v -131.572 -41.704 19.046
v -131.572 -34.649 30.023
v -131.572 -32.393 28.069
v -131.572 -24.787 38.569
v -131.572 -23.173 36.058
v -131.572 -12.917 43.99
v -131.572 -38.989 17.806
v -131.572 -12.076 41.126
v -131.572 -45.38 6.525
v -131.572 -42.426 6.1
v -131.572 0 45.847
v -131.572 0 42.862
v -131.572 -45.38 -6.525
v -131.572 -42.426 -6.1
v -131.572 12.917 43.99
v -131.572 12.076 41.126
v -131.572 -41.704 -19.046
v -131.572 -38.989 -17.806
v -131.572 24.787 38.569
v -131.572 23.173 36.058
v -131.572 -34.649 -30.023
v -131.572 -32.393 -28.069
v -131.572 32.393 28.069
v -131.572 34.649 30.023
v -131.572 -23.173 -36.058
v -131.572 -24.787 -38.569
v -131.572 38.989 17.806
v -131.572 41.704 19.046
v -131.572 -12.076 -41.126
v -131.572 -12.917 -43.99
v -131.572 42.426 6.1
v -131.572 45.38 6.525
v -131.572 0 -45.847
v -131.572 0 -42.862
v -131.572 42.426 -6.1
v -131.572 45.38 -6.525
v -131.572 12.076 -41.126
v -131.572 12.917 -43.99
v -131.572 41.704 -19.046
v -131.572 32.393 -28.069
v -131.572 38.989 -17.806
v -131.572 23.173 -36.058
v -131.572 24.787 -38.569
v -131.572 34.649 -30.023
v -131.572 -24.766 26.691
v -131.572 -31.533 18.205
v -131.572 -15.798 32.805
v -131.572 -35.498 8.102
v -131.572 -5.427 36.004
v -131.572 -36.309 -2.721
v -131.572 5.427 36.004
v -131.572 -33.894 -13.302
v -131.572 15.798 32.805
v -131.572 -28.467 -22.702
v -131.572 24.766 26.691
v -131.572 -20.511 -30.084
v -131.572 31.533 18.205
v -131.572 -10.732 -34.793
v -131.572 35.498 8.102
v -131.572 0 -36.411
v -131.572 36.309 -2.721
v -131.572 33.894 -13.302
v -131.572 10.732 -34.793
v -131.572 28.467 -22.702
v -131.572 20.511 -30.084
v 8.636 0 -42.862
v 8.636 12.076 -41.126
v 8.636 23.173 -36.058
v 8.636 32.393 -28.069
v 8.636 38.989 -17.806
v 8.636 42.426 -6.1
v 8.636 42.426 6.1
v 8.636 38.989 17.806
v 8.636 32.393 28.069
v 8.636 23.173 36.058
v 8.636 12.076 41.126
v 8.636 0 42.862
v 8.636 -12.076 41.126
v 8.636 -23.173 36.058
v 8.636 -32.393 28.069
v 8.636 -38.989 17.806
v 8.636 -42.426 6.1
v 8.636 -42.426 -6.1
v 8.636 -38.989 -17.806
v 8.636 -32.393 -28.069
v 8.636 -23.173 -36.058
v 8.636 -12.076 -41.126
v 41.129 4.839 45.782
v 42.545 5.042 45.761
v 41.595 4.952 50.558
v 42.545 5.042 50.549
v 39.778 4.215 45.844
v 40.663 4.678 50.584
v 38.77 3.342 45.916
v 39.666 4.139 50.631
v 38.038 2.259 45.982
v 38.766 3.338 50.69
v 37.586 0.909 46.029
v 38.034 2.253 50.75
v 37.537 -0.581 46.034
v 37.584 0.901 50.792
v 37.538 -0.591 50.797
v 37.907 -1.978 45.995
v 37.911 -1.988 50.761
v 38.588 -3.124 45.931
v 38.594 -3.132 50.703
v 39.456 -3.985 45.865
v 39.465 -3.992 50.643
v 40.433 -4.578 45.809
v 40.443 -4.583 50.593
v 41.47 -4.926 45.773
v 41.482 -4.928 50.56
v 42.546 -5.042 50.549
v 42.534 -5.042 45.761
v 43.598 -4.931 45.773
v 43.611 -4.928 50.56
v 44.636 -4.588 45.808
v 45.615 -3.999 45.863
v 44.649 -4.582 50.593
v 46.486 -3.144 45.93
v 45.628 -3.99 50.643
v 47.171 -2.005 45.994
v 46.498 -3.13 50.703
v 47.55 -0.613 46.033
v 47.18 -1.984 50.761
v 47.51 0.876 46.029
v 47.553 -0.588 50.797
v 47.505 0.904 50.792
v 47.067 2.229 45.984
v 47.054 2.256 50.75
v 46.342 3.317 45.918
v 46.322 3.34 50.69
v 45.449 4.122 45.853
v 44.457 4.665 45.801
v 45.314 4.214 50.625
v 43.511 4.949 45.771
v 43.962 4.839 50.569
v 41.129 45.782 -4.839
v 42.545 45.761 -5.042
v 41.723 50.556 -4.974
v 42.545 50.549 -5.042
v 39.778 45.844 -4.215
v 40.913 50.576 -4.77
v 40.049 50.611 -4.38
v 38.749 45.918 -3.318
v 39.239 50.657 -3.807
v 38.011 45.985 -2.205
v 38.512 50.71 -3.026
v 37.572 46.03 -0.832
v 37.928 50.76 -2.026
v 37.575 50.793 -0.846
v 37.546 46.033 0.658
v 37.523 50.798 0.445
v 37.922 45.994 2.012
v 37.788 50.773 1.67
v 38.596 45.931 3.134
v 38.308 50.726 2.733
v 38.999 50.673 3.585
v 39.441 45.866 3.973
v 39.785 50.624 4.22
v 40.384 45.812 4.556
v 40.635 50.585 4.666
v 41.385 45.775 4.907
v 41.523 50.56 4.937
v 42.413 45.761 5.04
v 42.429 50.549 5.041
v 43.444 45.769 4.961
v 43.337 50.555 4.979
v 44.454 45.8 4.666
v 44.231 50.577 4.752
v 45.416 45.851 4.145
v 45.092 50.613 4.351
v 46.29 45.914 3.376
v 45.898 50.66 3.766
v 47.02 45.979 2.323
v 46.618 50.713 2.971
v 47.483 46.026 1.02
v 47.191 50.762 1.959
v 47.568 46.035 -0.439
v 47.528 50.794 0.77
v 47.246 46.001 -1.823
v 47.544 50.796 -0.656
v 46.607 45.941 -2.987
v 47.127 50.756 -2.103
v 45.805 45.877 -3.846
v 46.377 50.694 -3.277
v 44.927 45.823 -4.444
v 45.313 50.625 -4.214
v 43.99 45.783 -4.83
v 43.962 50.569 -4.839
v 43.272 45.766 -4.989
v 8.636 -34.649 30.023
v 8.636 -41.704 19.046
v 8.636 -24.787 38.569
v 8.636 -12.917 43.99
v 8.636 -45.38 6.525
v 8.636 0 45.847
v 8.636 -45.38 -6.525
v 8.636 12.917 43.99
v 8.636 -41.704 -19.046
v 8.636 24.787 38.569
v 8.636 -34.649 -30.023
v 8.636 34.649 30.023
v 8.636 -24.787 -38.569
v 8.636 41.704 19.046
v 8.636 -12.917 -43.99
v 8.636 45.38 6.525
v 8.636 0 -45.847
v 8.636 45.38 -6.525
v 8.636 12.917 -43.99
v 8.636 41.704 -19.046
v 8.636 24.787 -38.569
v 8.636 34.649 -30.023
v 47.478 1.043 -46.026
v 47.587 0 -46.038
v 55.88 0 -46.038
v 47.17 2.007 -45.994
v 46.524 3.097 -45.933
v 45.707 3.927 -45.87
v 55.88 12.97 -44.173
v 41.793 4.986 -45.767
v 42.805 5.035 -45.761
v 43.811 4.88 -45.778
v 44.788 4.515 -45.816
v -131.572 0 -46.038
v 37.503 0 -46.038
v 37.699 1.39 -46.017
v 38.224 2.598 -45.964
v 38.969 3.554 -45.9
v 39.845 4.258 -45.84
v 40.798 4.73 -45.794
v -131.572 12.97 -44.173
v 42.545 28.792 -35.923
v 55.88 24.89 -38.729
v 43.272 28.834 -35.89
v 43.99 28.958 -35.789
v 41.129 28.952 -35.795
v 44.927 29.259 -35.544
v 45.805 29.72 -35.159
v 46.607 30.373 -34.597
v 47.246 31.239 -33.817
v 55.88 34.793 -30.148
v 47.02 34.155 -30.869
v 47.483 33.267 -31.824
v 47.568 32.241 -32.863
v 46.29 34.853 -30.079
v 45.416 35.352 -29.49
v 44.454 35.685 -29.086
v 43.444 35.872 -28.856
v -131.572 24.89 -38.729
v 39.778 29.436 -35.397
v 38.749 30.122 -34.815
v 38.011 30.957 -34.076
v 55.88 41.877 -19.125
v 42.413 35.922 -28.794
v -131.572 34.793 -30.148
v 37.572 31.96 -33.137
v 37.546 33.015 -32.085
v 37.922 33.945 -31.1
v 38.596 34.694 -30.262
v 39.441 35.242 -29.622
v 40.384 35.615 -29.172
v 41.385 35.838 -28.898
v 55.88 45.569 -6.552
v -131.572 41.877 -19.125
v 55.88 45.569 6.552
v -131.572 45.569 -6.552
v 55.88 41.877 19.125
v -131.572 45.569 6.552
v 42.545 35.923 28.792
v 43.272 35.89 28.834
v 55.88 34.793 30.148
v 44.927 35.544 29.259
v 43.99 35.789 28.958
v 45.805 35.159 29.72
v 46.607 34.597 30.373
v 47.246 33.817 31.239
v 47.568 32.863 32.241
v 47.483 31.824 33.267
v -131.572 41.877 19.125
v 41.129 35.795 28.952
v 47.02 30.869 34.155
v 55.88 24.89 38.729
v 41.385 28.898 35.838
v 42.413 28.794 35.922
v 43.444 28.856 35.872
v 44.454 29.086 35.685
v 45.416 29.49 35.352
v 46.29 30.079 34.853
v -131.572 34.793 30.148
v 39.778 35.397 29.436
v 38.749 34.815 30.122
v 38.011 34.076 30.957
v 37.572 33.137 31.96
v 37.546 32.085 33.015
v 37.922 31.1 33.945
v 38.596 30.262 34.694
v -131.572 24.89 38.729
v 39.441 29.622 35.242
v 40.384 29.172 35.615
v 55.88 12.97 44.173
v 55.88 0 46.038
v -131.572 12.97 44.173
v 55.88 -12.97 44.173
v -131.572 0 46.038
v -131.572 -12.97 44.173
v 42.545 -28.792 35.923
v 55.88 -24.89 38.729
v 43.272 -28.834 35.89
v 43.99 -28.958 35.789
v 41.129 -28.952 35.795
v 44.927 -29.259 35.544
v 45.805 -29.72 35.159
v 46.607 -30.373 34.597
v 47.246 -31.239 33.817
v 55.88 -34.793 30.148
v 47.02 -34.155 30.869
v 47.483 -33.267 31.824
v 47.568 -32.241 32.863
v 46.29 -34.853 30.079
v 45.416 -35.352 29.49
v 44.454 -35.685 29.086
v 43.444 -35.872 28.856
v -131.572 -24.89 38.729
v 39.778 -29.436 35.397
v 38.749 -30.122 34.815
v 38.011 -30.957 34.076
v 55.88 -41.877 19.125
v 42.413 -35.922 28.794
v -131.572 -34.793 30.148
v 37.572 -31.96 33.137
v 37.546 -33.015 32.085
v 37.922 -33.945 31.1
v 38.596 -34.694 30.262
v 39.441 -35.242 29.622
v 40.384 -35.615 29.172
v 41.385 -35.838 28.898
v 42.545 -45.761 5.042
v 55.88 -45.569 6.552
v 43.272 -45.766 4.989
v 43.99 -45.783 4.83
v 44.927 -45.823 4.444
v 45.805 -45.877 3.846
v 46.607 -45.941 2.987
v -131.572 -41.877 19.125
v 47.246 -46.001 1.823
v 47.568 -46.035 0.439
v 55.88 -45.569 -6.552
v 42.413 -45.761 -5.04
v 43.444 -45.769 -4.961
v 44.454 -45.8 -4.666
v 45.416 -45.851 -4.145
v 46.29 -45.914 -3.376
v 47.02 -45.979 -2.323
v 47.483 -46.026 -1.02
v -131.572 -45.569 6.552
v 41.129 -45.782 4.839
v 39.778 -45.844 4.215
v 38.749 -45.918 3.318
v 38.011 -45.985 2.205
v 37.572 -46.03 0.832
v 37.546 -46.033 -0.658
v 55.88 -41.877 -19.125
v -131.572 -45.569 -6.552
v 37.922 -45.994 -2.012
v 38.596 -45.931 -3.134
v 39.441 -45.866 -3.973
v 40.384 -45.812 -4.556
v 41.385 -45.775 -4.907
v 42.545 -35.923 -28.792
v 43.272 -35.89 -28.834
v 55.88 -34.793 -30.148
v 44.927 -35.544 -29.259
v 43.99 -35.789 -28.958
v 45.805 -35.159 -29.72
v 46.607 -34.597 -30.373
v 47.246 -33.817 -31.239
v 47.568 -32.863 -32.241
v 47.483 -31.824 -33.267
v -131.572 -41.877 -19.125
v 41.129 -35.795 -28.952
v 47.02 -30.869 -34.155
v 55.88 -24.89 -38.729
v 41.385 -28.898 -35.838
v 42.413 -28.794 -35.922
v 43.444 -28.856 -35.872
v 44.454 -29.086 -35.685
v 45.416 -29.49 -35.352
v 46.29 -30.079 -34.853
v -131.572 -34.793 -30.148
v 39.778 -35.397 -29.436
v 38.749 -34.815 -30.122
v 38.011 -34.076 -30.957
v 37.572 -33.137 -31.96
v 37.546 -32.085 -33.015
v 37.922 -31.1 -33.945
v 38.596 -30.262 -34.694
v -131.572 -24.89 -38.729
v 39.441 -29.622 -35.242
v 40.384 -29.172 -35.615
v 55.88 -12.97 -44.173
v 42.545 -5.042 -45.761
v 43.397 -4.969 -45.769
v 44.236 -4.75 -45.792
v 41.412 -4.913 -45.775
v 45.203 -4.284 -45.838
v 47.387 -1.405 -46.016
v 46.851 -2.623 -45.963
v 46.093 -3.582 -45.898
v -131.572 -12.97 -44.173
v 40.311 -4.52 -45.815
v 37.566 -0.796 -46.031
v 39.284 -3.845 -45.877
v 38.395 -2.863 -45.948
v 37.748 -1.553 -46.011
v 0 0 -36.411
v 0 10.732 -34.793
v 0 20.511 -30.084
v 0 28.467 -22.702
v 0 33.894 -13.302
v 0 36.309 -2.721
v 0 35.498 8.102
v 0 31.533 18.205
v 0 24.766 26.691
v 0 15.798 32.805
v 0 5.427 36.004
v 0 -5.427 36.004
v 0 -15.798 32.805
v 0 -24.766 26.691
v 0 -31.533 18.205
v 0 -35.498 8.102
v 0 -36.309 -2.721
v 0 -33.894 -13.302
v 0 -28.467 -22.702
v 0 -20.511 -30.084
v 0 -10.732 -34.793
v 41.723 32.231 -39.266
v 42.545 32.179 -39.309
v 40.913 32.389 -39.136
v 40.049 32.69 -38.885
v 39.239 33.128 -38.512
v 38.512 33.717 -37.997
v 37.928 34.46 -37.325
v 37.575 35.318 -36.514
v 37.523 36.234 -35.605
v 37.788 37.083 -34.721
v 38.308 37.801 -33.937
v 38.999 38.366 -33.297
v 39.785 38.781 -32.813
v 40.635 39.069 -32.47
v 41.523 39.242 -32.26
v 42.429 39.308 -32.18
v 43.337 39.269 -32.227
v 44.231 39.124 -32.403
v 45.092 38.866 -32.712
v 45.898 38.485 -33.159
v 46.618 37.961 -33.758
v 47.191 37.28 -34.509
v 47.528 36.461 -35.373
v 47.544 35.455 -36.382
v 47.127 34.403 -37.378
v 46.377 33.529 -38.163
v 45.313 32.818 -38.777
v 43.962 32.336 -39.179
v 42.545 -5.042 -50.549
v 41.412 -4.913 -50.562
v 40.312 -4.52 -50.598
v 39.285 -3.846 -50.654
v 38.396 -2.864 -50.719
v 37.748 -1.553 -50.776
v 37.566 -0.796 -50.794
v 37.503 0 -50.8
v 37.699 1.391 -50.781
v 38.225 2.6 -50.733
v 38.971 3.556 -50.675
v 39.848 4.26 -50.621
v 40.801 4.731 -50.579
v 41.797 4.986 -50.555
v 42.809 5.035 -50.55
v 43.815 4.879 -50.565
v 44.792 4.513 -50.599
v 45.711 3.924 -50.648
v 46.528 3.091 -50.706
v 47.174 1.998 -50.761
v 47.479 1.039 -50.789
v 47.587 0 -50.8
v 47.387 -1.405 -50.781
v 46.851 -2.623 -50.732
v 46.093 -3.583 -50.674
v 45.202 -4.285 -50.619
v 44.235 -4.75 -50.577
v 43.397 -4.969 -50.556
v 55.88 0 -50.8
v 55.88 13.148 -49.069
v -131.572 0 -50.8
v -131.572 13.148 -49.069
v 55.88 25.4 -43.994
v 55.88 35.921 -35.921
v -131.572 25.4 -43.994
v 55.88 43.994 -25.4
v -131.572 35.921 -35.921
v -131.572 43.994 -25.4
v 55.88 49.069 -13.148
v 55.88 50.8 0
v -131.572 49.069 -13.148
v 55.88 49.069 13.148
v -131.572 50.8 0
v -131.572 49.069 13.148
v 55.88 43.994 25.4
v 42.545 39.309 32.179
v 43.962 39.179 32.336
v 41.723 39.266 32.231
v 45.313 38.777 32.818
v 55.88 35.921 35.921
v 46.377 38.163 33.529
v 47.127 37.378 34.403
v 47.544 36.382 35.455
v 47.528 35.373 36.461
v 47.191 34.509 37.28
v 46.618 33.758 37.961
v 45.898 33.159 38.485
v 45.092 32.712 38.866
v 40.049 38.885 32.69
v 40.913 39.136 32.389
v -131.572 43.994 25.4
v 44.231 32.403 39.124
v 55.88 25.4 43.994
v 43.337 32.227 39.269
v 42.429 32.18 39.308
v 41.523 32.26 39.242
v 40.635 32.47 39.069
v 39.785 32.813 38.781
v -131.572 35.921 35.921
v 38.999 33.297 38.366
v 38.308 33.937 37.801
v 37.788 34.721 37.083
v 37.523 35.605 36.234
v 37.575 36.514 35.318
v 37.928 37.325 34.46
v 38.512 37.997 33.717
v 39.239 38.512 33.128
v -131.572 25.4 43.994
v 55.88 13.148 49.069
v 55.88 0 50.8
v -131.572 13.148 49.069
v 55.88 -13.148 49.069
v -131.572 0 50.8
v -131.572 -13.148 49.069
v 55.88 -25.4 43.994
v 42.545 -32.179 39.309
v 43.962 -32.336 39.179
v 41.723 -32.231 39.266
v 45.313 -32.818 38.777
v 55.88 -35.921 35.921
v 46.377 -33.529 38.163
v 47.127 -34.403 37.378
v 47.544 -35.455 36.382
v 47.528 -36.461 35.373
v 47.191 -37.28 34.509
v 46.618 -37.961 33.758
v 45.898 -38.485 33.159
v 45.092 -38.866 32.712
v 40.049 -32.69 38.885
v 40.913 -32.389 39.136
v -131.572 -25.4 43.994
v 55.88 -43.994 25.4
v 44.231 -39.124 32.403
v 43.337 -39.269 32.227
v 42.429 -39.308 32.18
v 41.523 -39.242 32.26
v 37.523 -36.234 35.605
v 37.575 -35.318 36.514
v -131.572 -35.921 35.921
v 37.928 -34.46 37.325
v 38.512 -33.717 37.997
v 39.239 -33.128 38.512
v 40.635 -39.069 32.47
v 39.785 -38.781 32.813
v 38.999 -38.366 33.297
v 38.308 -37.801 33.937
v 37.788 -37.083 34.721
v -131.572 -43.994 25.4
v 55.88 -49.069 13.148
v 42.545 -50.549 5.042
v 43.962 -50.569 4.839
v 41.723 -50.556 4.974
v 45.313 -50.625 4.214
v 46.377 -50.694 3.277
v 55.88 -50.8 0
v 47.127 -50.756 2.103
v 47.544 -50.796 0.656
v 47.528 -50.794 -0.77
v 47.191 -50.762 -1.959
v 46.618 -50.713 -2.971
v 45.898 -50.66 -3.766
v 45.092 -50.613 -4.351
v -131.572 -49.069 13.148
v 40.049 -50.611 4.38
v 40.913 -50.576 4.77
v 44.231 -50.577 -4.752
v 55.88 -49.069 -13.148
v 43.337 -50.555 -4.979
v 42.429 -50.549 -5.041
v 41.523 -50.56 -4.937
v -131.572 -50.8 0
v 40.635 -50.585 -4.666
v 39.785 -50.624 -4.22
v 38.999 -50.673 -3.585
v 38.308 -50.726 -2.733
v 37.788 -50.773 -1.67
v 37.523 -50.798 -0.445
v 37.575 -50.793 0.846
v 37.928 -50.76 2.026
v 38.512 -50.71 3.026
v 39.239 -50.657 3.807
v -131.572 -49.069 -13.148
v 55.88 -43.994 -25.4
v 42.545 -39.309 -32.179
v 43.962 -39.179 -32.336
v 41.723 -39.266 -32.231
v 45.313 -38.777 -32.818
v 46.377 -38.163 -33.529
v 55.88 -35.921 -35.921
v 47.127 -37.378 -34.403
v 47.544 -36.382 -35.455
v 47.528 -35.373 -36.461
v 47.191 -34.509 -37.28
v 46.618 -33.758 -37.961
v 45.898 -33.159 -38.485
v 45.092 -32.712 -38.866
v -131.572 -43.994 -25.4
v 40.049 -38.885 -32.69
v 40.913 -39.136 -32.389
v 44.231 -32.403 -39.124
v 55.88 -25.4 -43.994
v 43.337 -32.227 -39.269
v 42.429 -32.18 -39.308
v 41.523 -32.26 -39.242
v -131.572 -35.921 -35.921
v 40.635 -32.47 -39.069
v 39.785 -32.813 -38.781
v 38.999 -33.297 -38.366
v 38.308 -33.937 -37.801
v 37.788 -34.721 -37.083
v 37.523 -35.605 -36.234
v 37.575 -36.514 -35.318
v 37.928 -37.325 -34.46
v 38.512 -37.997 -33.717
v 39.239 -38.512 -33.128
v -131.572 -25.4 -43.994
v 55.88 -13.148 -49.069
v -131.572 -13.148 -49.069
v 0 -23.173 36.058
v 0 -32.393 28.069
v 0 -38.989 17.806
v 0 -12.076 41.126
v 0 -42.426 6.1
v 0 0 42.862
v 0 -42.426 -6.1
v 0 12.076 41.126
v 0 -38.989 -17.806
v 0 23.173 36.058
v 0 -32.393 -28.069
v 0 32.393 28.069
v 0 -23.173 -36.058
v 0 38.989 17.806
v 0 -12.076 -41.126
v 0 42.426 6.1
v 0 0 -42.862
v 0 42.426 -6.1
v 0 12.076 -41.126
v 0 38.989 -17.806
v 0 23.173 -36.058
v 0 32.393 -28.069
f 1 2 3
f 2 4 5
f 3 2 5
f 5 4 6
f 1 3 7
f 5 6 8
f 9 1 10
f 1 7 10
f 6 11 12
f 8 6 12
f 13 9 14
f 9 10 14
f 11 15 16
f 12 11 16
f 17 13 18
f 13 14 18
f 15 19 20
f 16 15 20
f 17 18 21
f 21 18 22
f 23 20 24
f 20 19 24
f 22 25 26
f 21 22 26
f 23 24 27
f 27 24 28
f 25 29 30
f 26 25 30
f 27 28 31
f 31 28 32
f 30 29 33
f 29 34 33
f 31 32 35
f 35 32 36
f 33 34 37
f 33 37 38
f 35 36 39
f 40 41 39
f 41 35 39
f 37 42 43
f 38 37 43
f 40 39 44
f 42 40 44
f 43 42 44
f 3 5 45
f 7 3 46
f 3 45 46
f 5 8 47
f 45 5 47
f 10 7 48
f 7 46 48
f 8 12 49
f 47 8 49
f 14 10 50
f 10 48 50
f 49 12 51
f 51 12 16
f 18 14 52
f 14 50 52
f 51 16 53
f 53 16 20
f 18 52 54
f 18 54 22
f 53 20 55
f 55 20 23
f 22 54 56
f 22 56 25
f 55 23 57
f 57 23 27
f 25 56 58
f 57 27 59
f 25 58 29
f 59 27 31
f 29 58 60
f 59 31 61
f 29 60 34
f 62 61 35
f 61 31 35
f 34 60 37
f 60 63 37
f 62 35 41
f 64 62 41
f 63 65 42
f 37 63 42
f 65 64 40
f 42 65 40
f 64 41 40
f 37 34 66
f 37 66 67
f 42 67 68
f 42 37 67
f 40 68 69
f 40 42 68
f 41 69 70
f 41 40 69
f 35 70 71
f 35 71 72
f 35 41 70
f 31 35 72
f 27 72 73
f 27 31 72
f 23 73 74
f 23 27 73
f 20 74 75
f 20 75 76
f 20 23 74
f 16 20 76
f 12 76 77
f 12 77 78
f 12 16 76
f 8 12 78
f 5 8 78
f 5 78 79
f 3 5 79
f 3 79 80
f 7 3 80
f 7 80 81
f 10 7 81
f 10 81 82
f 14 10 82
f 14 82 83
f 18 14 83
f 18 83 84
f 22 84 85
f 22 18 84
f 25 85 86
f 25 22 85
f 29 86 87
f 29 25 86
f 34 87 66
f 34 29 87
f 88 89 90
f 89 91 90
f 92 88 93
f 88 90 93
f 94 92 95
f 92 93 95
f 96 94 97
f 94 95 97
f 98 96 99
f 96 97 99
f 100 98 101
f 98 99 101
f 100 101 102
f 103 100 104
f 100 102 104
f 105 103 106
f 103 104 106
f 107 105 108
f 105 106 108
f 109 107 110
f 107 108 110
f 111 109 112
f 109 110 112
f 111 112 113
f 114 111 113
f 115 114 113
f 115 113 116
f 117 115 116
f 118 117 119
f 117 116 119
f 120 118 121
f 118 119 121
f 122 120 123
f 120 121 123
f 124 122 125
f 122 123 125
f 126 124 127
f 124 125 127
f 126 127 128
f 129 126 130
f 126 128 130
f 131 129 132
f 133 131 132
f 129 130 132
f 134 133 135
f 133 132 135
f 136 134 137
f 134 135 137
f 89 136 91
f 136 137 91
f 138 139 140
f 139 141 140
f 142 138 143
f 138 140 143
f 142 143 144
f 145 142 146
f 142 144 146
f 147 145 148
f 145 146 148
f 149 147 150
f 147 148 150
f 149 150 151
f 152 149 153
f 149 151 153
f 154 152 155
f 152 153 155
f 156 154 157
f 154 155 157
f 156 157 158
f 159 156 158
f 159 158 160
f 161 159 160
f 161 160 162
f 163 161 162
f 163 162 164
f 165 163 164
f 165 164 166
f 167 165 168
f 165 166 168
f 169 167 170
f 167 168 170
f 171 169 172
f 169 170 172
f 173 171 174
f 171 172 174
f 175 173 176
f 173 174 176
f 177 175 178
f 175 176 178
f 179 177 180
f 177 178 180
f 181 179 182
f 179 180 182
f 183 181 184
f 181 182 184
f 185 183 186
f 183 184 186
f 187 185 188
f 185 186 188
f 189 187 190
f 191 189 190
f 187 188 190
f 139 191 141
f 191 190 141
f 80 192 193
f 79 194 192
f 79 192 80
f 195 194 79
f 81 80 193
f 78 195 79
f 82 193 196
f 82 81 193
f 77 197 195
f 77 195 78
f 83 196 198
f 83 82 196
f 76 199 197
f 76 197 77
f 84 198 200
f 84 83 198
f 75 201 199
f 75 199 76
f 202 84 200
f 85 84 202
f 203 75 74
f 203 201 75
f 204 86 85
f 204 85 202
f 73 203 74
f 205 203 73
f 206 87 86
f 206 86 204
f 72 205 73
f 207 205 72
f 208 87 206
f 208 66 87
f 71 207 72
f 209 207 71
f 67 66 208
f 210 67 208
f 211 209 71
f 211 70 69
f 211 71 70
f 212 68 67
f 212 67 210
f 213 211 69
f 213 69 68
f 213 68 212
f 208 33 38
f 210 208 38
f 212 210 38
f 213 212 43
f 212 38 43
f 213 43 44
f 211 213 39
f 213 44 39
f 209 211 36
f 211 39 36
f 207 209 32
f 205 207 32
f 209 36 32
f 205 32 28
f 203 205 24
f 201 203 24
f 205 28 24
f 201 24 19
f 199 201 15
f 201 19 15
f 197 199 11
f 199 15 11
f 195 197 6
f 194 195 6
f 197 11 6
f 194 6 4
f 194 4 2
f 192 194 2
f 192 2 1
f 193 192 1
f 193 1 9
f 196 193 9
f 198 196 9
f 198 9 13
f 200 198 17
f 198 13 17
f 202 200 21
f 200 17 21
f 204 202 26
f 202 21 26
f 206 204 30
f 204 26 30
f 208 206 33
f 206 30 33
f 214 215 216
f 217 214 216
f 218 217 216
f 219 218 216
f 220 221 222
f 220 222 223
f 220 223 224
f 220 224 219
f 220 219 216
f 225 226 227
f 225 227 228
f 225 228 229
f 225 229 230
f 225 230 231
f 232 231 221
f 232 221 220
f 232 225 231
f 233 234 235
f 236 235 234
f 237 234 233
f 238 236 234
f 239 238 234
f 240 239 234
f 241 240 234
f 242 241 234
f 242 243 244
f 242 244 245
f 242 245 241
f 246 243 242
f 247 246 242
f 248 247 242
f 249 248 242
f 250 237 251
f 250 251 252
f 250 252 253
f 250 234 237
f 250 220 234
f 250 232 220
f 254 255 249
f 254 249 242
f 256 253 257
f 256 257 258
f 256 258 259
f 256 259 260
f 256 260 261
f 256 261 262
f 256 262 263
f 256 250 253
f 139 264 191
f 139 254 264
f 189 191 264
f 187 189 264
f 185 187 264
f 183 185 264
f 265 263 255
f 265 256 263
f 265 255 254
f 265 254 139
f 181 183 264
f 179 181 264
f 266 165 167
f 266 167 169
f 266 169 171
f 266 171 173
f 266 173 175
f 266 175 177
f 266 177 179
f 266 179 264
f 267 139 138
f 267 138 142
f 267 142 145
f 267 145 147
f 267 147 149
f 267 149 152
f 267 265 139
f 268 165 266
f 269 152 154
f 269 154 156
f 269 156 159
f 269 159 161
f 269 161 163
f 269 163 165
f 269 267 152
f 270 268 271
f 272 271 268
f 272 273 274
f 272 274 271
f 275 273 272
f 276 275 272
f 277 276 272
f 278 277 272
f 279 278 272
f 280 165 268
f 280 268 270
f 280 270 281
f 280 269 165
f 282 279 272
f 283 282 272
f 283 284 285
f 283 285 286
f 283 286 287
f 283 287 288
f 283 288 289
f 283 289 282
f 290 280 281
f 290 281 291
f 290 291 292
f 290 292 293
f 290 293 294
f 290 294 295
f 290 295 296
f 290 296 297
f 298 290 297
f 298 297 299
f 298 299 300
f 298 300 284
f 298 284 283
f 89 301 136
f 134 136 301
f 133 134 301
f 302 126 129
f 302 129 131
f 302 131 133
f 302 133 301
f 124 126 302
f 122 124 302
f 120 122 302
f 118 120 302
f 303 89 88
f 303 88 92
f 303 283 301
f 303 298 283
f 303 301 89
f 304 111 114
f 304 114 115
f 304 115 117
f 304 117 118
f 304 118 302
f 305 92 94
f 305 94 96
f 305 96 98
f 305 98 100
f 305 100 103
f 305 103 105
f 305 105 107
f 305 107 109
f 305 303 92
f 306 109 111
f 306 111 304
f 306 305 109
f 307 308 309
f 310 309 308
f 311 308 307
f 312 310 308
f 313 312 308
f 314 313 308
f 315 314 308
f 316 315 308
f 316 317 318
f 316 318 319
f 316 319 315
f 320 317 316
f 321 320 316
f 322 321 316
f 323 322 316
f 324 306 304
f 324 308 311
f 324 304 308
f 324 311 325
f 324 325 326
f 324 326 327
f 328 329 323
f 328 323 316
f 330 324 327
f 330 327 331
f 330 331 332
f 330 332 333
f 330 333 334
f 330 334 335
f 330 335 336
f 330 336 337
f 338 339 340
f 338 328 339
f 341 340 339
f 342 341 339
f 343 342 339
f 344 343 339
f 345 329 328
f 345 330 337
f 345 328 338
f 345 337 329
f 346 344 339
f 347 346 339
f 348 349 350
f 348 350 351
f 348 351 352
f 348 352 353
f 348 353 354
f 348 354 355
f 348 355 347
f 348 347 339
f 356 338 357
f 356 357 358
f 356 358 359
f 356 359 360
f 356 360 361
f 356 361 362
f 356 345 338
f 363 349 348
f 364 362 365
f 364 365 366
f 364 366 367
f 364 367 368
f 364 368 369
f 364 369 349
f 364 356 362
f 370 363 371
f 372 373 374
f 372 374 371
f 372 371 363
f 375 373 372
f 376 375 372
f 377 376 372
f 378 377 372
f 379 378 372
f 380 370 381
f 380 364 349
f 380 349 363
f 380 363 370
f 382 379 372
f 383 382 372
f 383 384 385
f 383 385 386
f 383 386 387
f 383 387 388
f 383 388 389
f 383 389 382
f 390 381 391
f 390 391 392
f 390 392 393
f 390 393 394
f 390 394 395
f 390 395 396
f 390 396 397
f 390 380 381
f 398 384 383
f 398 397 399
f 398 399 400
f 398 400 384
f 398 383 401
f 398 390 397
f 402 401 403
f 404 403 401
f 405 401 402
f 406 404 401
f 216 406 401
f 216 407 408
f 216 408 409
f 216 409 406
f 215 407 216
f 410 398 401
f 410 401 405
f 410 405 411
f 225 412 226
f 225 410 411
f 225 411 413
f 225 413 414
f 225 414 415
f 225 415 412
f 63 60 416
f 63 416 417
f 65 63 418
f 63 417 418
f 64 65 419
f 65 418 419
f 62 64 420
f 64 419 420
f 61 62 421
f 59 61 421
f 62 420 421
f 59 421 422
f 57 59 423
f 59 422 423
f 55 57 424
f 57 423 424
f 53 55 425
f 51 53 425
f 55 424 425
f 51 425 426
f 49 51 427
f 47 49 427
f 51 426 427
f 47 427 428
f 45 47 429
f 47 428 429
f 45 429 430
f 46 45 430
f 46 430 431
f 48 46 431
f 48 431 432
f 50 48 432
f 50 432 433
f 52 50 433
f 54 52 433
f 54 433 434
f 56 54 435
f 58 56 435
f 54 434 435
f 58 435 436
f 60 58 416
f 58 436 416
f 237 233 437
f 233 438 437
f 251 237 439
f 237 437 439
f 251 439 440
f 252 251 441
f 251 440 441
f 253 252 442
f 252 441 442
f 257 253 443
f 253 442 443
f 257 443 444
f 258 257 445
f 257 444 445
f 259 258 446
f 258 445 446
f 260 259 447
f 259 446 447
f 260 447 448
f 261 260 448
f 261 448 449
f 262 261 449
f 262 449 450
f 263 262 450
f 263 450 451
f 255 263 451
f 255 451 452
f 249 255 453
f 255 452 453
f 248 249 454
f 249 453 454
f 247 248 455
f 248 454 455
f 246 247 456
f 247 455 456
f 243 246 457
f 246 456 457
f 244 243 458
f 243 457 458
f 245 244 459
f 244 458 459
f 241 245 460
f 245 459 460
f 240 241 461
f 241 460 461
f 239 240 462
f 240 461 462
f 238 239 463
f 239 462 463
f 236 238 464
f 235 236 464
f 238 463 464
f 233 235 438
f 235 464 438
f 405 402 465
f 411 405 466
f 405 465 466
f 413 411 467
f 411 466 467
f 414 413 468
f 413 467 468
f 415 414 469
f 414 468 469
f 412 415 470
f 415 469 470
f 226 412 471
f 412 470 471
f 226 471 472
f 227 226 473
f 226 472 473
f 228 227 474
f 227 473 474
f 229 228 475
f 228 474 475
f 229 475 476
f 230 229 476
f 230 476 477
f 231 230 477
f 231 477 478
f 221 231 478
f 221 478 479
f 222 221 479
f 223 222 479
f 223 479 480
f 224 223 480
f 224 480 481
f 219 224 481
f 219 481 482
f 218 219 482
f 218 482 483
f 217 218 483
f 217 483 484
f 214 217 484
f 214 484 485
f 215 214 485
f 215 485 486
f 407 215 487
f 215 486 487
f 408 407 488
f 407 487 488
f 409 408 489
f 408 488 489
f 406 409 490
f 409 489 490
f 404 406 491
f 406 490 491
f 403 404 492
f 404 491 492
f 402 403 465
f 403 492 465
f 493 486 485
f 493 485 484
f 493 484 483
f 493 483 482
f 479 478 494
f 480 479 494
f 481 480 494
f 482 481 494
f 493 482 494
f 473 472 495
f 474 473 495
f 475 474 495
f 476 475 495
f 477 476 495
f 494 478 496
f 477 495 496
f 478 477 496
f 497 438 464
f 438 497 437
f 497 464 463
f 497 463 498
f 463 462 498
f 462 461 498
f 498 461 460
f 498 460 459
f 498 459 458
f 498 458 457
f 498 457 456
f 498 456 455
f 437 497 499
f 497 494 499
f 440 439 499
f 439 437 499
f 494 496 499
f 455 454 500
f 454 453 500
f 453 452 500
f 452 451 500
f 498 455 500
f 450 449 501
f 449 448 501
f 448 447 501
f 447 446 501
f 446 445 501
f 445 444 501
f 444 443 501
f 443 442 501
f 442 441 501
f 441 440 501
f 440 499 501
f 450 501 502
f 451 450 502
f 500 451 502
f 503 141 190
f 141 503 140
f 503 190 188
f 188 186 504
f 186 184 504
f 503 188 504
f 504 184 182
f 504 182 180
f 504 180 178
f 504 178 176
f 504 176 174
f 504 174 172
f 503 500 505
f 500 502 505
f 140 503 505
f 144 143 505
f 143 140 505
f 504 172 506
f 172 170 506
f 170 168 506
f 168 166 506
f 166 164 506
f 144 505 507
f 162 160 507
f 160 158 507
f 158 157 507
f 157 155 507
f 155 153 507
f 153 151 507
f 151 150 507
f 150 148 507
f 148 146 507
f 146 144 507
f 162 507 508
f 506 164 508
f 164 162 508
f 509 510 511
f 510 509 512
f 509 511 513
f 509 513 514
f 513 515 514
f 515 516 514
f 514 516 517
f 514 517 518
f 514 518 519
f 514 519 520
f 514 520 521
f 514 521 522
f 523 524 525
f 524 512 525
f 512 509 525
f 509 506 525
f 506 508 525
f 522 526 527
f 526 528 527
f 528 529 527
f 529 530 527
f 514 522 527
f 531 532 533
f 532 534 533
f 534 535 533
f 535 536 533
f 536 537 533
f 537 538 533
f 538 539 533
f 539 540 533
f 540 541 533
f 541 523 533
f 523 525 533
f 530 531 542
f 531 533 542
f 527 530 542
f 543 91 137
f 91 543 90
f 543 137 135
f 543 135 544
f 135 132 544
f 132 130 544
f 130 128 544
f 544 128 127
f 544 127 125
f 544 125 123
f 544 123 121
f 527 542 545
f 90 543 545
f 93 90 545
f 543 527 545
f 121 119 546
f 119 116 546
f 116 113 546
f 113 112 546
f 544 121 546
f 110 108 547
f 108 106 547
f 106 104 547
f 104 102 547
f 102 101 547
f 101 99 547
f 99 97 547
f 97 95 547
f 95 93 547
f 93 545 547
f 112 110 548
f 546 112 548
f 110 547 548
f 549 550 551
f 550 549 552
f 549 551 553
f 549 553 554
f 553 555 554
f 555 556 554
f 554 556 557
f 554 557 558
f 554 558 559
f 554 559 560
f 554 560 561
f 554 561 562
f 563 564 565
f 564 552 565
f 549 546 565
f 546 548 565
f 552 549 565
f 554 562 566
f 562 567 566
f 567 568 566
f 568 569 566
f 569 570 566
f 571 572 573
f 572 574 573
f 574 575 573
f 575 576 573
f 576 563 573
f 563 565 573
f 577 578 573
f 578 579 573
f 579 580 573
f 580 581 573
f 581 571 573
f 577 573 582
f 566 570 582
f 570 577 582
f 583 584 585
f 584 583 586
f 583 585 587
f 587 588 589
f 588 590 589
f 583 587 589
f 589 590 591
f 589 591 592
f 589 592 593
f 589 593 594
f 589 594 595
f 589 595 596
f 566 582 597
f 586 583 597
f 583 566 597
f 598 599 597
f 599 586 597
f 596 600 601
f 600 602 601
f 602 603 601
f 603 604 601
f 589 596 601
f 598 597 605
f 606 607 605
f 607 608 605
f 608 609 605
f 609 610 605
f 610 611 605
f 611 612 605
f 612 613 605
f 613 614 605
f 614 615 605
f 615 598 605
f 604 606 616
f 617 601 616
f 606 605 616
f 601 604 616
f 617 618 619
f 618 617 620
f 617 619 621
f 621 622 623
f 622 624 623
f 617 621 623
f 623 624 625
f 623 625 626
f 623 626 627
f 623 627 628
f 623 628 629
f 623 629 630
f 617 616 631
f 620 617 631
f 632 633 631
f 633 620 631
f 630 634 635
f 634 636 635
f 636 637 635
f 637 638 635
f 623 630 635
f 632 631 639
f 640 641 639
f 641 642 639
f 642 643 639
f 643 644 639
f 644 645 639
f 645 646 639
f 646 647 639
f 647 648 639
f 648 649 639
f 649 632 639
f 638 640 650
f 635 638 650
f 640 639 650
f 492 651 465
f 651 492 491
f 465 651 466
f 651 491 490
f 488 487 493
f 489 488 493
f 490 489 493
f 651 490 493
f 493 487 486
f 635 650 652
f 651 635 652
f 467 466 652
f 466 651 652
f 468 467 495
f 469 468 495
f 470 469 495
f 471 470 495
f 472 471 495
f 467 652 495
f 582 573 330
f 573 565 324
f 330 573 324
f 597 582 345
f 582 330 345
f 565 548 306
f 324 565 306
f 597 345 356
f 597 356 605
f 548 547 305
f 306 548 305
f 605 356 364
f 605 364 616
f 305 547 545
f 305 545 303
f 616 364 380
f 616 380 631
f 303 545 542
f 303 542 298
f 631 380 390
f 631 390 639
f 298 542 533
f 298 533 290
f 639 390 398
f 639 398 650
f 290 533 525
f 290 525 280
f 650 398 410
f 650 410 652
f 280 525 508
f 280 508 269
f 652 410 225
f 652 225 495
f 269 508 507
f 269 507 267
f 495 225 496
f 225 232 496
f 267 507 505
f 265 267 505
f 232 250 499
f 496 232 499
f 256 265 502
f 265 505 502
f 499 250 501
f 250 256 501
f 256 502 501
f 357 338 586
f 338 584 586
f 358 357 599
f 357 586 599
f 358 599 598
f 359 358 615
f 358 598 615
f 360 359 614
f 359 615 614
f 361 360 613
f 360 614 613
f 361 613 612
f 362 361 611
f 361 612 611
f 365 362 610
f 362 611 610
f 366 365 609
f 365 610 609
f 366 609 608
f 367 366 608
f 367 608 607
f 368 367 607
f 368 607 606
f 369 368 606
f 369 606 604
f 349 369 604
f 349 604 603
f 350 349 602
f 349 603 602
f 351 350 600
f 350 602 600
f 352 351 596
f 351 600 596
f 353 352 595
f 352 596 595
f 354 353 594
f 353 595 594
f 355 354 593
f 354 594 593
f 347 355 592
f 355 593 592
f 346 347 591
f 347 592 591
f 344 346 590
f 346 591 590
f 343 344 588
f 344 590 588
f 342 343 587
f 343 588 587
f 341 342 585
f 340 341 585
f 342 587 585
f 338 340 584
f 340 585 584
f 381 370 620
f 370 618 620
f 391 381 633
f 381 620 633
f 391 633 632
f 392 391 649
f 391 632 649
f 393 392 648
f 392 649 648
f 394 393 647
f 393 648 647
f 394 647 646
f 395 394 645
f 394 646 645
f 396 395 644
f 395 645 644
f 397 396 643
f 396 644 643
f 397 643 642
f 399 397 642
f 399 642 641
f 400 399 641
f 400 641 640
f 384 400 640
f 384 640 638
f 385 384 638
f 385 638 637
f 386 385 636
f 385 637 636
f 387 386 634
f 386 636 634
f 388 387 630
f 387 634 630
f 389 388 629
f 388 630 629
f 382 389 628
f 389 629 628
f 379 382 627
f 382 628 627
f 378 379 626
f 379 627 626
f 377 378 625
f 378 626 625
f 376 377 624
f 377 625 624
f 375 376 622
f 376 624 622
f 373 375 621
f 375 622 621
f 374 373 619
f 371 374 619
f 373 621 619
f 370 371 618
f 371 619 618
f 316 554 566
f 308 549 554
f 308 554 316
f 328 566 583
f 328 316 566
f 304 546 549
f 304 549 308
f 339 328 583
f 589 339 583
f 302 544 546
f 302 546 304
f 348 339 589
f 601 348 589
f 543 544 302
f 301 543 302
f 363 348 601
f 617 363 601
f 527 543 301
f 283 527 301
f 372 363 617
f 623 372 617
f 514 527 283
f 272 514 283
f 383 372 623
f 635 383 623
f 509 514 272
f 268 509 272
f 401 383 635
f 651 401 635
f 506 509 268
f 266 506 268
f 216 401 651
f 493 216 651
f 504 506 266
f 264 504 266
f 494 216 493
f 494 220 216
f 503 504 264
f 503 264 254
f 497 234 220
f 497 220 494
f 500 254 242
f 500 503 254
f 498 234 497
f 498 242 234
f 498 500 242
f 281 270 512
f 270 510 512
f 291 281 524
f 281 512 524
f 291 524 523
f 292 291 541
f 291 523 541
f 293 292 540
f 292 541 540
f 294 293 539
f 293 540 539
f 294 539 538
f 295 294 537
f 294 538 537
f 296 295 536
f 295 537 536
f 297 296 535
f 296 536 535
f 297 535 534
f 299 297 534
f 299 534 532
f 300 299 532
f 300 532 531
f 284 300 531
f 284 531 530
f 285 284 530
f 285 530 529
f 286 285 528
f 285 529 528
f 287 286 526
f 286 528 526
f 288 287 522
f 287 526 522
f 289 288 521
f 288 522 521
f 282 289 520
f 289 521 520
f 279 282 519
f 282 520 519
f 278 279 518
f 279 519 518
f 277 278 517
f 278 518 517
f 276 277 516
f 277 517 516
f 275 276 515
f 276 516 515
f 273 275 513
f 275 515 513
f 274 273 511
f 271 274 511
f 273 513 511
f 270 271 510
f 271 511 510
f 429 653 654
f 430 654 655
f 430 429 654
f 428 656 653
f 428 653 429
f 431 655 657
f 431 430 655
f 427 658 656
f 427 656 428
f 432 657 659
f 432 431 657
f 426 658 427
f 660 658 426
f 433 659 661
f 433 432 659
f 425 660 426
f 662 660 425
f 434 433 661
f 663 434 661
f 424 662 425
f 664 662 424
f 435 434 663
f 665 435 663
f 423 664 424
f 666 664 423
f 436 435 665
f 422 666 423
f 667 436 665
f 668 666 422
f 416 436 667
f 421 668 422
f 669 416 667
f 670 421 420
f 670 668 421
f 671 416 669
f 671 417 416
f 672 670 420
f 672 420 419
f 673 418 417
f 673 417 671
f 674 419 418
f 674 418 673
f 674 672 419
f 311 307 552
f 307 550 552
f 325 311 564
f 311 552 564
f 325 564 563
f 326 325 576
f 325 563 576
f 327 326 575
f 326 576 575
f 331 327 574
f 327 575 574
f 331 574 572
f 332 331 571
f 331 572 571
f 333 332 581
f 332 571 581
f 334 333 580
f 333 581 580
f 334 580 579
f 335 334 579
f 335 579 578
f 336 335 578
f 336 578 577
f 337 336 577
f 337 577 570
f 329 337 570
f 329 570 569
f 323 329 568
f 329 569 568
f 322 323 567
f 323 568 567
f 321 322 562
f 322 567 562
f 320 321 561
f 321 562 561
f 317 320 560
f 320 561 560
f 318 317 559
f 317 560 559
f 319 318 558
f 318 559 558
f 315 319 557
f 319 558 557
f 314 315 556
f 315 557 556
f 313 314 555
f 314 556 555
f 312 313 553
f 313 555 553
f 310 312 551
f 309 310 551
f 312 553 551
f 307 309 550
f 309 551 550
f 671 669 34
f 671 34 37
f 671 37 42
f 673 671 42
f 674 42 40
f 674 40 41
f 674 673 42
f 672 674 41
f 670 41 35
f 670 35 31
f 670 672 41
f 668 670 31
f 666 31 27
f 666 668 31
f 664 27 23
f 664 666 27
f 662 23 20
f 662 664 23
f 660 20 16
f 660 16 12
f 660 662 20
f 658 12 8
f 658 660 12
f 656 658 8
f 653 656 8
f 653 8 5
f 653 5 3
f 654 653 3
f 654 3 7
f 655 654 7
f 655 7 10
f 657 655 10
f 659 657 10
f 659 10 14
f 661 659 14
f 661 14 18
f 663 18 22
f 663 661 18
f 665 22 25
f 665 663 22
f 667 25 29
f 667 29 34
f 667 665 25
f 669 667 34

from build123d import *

# Parameters (mm, degrees)
BOSS_EXTRUDE1_DEPTH      = 55.88
BOSS_EXTRUDE1_DEPTH_BACK = 131.572
SKETCH1_R                = 50.8
SKETCH1_R_2              = 46.0375
BOSS_EXTRUDE2_DEPTH      = 8.636
BOSS_EXTRUDE2_DEPTH_BACK = 131.572
SKETCH1_3_R              = 45.847
SKETCH1_3_R_2            = 42.8625
SKETCH3_W                = 5.0419
SKETCH3_H                = 50.8
CIRPATTERN1_COUNT        = 8
SKETCH1_5_R              = 42.8625
SKETCH1_5_R_2            = 36.4109
BOSS_EXTRUDE4_DEPTH      = 131.572


with BuildPart() as part:
    # Sketch1 → Boss-Extrude1 (new, two sides: drawn at the far end of the back side and taken through both)
    with BuildSketch(Plane(origin=(0, 0, 0), x_dir=(0, 0, -1), z_dir=(1, 0, 0)).offset(-BOSS_EXTRUDE1_DEPTH_BACK)):
        Circle(SKETCH1_R)
        Circle(SKETCH1_R_2, mode=Mode.SUBTRACT)
    extrude(amount=BOSS_EXTRUDE1_DEPTH + BOSS_EXTRUDE1_DEPTH_BACK)

    # Sketch3 → Tap Drill for 3/8 Helicoil1 (revolve, cut)
    with BuildSketch(Plane(origin=(42.545, 0, 0), x_dir=(0, -1, 0), z_dir=(1, 0, 0))):
        with Locations((2.52095, 25.4)):
            Rectangle(SKETCH3_W, SKETCH3_H)
    tap_drill_for_3_8_helicoil1 = revolve(axis=Axis((42.545, 0, 6.35), (0, 0, -1)), mode=Mode.SUBTRACT)

    # CirPattern1: Tap Drill for 3/8 Helicoil1 ×8 about axis
    cirpattern1_axis = Axis((74.60738497, 0, 0), (-1, 0, 0))
    for i in range(1, CIRPATTERN1_COUNT):
        add(tap_drill_for_3_8_helicoil1.rotate(cirpattern1_axis, i * 360 / CIRPATTERN1_COUNT), mode=Mode.SUBTRACT)


with BuildPart() as body_2:
    # Sketch1<3> → Boss-Extrude2 (new, two sides: drawn at the far end of the back side and taken through both)
    with BuildSketch(Plane(origin=(0, 0, 0), x_dir=(0, 0, -1), z_dir=(1, 0, 0)).offset(-BOSS_EXTRUDE2_DEPTH_BACK)):
        Circle(SKETCH1_3_R)
        Circle(SKETCH1_3_R_2, mode=Mode.SUBTRACT)
    extrude(amount=BOSS_EXTRUDE2_DEPTH + BOSS_EXTRUDE2_DEPTH_BACK)


with BuildPart() as body_3:
    # Sketch1<5> → Boss-Extrude4 (new body)
    with BuildSketch(Plane(origin=(0, 0, 0), x_dir=(0, 0, -1), z_dir=(1, 0, 0))):
        Circle(SKETCH1_5_R)
        Circle(SKETCH1_5_R_2, mode=Mode.SUBTRACT)
    extrude(amount=-BOSS_EXTRUDE4_DEPTH)


solid = Compound([part.part, body_2.part, body_3.part])
